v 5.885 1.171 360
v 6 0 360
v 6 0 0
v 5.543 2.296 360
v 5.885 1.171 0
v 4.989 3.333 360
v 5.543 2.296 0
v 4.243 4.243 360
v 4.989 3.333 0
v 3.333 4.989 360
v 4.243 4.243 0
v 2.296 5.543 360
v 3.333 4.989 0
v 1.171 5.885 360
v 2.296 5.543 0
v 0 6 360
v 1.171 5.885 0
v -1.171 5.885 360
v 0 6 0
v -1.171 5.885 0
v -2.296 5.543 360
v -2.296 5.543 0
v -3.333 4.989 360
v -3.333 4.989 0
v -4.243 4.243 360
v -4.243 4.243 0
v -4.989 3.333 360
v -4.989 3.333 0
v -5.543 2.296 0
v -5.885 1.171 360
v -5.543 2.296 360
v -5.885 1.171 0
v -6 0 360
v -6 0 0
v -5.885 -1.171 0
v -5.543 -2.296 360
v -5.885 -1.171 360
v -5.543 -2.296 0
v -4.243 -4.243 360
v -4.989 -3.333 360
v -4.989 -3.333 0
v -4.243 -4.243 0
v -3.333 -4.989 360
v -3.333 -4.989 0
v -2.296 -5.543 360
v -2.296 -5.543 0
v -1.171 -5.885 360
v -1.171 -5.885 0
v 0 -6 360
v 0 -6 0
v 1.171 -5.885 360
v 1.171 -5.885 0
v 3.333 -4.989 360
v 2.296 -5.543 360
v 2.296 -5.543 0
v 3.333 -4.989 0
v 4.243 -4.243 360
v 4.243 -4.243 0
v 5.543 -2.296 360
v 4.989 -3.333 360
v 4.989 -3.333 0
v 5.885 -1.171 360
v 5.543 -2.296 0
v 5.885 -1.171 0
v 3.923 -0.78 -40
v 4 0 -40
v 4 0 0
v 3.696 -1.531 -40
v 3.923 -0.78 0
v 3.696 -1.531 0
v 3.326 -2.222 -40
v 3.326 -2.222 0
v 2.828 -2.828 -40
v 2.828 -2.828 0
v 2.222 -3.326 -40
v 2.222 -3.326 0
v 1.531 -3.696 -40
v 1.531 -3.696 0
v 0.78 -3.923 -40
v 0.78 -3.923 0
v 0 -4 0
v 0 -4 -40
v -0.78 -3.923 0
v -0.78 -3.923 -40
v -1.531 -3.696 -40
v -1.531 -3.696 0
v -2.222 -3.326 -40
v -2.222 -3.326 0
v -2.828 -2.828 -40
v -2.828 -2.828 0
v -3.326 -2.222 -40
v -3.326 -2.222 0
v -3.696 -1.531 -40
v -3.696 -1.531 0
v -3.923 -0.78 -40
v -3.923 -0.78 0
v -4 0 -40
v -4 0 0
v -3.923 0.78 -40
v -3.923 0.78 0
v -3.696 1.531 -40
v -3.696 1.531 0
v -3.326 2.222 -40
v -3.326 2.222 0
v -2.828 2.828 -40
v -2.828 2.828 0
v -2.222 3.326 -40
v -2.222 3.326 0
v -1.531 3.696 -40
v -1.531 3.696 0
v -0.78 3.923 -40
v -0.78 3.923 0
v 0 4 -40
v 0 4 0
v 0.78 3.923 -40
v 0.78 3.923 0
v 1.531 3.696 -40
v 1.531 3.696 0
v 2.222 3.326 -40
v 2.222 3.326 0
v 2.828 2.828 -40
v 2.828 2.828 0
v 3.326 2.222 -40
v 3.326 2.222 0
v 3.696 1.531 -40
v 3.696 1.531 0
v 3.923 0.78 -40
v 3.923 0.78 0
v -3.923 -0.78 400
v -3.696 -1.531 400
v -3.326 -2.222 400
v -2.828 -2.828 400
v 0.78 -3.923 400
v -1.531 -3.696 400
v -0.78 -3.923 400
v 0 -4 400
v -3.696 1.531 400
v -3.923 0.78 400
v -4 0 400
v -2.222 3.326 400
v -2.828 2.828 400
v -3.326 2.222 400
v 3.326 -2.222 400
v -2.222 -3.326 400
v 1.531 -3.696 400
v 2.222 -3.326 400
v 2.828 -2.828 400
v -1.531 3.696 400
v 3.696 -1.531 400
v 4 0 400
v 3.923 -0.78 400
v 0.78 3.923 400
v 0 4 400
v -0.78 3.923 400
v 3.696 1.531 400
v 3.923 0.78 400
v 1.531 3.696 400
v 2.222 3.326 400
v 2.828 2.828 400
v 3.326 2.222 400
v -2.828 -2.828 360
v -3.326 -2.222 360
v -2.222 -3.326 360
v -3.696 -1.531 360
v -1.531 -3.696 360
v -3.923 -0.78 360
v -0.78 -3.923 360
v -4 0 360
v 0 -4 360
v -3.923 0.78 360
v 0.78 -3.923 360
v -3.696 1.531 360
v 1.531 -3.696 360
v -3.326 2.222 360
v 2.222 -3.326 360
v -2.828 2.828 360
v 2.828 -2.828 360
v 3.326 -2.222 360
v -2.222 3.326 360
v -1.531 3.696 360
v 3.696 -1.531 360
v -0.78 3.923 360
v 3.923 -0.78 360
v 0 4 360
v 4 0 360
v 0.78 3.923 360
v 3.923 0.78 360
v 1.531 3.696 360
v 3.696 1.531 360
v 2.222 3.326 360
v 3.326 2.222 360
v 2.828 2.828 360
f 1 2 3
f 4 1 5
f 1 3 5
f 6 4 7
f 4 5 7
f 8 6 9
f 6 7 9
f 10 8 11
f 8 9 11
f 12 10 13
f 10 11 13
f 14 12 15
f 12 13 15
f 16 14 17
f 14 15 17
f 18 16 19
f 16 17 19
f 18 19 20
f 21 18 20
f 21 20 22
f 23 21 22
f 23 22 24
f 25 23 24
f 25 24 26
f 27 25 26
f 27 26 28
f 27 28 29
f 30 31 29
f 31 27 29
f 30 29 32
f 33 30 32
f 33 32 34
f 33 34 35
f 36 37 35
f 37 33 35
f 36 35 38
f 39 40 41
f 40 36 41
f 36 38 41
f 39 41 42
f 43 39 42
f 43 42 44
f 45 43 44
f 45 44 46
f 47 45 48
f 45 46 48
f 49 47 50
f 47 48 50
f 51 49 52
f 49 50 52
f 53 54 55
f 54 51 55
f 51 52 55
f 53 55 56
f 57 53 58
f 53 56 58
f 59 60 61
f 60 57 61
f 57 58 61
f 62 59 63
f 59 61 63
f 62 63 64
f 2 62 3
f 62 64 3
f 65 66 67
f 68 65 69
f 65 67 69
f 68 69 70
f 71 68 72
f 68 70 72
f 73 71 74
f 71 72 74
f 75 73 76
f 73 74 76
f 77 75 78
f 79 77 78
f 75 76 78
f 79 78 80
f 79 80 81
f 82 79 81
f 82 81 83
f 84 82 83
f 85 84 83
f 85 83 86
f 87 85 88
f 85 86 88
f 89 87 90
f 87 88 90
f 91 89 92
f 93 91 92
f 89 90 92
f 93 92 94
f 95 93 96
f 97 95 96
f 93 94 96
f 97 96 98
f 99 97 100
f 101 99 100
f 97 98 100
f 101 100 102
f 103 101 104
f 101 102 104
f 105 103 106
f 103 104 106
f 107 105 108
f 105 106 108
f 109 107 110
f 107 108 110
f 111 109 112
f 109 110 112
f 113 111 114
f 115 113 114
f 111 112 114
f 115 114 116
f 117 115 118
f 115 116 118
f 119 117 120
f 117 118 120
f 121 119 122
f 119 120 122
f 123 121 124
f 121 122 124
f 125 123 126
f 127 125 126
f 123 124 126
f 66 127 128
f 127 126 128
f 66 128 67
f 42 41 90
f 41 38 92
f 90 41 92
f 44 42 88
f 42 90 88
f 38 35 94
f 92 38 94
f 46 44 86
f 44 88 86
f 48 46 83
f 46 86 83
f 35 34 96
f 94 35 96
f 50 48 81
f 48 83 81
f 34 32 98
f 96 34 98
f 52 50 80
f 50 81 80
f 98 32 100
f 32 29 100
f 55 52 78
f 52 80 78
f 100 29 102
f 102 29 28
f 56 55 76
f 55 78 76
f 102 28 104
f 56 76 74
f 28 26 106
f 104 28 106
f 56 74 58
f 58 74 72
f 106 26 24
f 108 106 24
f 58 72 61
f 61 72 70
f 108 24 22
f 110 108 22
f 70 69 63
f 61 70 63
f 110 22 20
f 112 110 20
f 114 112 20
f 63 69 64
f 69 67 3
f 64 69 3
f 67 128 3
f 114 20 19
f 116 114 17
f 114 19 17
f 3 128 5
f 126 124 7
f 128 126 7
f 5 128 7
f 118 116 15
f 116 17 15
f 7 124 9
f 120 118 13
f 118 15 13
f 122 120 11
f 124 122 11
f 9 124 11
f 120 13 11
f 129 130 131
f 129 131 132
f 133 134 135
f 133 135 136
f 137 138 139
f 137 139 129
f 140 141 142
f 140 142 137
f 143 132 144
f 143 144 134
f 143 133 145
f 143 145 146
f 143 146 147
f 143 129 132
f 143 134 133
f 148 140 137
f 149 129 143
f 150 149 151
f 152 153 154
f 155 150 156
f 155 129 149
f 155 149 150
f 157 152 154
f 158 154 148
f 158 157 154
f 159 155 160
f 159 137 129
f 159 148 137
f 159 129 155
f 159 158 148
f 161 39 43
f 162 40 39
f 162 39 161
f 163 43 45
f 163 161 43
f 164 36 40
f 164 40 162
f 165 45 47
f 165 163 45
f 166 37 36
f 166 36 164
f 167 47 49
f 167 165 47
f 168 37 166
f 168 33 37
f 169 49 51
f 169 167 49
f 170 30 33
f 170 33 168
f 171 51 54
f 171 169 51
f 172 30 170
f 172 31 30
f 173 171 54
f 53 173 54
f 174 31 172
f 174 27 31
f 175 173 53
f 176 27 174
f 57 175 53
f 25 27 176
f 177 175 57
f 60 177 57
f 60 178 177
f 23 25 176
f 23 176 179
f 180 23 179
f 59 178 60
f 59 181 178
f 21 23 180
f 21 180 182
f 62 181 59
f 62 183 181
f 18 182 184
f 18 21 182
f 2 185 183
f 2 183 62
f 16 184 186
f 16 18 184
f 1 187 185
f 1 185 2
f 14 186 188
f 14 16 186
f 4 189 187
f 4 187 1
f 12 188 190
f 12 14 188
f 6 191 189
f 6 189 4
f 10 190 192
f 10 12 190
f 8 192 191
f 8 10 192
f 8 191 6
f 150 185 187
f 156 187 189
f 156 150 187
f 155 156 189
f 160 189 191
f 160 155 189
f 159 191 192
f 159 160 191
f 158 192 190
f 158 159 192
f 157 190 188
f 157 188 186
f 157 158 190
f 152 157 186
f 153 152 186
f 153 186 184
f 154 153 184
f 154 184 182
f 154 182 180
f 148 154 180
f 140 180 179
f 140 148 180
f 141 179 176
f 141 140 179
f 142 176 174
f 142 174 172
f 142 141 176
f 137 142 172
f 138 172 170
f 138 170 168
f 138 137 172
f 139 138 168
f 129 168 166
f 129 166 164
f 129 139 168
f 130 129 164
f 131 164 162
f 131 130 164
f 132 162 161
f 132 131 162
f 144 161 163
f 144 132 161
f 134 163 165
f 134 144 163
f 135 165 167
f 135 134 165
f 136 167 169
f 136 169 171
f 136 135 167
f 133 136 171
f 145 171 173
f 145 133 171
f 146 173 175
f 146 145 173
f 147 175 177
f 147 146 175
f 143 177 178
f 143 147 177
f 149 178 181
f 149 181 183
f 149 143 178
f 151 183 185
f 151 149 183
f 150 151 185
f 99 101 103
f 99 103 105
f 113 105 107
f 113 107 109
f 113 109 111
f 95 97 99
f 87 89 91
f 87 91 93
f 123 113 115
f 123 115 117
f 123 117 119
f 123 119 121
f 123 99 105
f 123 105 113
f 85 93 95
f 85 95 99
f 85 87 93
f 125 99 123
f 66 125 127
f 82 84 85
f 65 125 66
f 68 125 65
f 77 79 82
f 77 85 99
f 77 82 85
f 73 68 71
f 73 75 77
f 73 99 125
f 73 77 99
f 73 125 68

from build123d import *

# Parameters (mm, degrees)
CROQUIS1_R              = 6
SALIENTE_EXTRUIR1_DEPTH = 400
CROQUIS2_OUTSIDE_W      = 94.072
CROQUIS2_OUTSIDE_H      = 94.072
CROQUIS2_OUTSIDE_R      = 4
CORTAR_EXTRUIR3_DEPTH   = 40
CROQUIS3_R              = 4
SALIENTE_EXTRUIR2_DEPTH = 40


with BuildPart() as part:
    # Croquis1 → Saliente-Extruir1 (new body)
    with BuildSketch(Plane.XY):
        Circle(CROQUIS1_R)
    extrude(amount=SALIENTE_EXTRUIR1_DEPTH)

    # Croquis2 outside → Cortar-Extruir3 (cut)
    with BuildSketch(Plane.XY.offset(400)):
        Rectangle(CROQUIS2_OUTSIDE_W, CROQUIS2_OUTSIDE_H)
        Circle(CROQUIS2_OUTSIDE_R, mode=Mode.SUBTRACT)
    extrude(amount=-CORTAR_EXTRUIR3_DEPTH, mode=Mode.SUBTRACT)

    # Croquis3 → Saliente-Extruir2 (add)
    with BuildSketch(Plane(origin=(0, 0, 0), x_dir=(-1, 0, 0), z_dir=(0, 0, -1))):
        with Locations(Location((0, 0, 0), (0, 0, 180))):
            Circle(CROQUIS3_R)
    extrude(amount=SALIENTE_EXTRUIR2_DEPTH)


solid = part.part
